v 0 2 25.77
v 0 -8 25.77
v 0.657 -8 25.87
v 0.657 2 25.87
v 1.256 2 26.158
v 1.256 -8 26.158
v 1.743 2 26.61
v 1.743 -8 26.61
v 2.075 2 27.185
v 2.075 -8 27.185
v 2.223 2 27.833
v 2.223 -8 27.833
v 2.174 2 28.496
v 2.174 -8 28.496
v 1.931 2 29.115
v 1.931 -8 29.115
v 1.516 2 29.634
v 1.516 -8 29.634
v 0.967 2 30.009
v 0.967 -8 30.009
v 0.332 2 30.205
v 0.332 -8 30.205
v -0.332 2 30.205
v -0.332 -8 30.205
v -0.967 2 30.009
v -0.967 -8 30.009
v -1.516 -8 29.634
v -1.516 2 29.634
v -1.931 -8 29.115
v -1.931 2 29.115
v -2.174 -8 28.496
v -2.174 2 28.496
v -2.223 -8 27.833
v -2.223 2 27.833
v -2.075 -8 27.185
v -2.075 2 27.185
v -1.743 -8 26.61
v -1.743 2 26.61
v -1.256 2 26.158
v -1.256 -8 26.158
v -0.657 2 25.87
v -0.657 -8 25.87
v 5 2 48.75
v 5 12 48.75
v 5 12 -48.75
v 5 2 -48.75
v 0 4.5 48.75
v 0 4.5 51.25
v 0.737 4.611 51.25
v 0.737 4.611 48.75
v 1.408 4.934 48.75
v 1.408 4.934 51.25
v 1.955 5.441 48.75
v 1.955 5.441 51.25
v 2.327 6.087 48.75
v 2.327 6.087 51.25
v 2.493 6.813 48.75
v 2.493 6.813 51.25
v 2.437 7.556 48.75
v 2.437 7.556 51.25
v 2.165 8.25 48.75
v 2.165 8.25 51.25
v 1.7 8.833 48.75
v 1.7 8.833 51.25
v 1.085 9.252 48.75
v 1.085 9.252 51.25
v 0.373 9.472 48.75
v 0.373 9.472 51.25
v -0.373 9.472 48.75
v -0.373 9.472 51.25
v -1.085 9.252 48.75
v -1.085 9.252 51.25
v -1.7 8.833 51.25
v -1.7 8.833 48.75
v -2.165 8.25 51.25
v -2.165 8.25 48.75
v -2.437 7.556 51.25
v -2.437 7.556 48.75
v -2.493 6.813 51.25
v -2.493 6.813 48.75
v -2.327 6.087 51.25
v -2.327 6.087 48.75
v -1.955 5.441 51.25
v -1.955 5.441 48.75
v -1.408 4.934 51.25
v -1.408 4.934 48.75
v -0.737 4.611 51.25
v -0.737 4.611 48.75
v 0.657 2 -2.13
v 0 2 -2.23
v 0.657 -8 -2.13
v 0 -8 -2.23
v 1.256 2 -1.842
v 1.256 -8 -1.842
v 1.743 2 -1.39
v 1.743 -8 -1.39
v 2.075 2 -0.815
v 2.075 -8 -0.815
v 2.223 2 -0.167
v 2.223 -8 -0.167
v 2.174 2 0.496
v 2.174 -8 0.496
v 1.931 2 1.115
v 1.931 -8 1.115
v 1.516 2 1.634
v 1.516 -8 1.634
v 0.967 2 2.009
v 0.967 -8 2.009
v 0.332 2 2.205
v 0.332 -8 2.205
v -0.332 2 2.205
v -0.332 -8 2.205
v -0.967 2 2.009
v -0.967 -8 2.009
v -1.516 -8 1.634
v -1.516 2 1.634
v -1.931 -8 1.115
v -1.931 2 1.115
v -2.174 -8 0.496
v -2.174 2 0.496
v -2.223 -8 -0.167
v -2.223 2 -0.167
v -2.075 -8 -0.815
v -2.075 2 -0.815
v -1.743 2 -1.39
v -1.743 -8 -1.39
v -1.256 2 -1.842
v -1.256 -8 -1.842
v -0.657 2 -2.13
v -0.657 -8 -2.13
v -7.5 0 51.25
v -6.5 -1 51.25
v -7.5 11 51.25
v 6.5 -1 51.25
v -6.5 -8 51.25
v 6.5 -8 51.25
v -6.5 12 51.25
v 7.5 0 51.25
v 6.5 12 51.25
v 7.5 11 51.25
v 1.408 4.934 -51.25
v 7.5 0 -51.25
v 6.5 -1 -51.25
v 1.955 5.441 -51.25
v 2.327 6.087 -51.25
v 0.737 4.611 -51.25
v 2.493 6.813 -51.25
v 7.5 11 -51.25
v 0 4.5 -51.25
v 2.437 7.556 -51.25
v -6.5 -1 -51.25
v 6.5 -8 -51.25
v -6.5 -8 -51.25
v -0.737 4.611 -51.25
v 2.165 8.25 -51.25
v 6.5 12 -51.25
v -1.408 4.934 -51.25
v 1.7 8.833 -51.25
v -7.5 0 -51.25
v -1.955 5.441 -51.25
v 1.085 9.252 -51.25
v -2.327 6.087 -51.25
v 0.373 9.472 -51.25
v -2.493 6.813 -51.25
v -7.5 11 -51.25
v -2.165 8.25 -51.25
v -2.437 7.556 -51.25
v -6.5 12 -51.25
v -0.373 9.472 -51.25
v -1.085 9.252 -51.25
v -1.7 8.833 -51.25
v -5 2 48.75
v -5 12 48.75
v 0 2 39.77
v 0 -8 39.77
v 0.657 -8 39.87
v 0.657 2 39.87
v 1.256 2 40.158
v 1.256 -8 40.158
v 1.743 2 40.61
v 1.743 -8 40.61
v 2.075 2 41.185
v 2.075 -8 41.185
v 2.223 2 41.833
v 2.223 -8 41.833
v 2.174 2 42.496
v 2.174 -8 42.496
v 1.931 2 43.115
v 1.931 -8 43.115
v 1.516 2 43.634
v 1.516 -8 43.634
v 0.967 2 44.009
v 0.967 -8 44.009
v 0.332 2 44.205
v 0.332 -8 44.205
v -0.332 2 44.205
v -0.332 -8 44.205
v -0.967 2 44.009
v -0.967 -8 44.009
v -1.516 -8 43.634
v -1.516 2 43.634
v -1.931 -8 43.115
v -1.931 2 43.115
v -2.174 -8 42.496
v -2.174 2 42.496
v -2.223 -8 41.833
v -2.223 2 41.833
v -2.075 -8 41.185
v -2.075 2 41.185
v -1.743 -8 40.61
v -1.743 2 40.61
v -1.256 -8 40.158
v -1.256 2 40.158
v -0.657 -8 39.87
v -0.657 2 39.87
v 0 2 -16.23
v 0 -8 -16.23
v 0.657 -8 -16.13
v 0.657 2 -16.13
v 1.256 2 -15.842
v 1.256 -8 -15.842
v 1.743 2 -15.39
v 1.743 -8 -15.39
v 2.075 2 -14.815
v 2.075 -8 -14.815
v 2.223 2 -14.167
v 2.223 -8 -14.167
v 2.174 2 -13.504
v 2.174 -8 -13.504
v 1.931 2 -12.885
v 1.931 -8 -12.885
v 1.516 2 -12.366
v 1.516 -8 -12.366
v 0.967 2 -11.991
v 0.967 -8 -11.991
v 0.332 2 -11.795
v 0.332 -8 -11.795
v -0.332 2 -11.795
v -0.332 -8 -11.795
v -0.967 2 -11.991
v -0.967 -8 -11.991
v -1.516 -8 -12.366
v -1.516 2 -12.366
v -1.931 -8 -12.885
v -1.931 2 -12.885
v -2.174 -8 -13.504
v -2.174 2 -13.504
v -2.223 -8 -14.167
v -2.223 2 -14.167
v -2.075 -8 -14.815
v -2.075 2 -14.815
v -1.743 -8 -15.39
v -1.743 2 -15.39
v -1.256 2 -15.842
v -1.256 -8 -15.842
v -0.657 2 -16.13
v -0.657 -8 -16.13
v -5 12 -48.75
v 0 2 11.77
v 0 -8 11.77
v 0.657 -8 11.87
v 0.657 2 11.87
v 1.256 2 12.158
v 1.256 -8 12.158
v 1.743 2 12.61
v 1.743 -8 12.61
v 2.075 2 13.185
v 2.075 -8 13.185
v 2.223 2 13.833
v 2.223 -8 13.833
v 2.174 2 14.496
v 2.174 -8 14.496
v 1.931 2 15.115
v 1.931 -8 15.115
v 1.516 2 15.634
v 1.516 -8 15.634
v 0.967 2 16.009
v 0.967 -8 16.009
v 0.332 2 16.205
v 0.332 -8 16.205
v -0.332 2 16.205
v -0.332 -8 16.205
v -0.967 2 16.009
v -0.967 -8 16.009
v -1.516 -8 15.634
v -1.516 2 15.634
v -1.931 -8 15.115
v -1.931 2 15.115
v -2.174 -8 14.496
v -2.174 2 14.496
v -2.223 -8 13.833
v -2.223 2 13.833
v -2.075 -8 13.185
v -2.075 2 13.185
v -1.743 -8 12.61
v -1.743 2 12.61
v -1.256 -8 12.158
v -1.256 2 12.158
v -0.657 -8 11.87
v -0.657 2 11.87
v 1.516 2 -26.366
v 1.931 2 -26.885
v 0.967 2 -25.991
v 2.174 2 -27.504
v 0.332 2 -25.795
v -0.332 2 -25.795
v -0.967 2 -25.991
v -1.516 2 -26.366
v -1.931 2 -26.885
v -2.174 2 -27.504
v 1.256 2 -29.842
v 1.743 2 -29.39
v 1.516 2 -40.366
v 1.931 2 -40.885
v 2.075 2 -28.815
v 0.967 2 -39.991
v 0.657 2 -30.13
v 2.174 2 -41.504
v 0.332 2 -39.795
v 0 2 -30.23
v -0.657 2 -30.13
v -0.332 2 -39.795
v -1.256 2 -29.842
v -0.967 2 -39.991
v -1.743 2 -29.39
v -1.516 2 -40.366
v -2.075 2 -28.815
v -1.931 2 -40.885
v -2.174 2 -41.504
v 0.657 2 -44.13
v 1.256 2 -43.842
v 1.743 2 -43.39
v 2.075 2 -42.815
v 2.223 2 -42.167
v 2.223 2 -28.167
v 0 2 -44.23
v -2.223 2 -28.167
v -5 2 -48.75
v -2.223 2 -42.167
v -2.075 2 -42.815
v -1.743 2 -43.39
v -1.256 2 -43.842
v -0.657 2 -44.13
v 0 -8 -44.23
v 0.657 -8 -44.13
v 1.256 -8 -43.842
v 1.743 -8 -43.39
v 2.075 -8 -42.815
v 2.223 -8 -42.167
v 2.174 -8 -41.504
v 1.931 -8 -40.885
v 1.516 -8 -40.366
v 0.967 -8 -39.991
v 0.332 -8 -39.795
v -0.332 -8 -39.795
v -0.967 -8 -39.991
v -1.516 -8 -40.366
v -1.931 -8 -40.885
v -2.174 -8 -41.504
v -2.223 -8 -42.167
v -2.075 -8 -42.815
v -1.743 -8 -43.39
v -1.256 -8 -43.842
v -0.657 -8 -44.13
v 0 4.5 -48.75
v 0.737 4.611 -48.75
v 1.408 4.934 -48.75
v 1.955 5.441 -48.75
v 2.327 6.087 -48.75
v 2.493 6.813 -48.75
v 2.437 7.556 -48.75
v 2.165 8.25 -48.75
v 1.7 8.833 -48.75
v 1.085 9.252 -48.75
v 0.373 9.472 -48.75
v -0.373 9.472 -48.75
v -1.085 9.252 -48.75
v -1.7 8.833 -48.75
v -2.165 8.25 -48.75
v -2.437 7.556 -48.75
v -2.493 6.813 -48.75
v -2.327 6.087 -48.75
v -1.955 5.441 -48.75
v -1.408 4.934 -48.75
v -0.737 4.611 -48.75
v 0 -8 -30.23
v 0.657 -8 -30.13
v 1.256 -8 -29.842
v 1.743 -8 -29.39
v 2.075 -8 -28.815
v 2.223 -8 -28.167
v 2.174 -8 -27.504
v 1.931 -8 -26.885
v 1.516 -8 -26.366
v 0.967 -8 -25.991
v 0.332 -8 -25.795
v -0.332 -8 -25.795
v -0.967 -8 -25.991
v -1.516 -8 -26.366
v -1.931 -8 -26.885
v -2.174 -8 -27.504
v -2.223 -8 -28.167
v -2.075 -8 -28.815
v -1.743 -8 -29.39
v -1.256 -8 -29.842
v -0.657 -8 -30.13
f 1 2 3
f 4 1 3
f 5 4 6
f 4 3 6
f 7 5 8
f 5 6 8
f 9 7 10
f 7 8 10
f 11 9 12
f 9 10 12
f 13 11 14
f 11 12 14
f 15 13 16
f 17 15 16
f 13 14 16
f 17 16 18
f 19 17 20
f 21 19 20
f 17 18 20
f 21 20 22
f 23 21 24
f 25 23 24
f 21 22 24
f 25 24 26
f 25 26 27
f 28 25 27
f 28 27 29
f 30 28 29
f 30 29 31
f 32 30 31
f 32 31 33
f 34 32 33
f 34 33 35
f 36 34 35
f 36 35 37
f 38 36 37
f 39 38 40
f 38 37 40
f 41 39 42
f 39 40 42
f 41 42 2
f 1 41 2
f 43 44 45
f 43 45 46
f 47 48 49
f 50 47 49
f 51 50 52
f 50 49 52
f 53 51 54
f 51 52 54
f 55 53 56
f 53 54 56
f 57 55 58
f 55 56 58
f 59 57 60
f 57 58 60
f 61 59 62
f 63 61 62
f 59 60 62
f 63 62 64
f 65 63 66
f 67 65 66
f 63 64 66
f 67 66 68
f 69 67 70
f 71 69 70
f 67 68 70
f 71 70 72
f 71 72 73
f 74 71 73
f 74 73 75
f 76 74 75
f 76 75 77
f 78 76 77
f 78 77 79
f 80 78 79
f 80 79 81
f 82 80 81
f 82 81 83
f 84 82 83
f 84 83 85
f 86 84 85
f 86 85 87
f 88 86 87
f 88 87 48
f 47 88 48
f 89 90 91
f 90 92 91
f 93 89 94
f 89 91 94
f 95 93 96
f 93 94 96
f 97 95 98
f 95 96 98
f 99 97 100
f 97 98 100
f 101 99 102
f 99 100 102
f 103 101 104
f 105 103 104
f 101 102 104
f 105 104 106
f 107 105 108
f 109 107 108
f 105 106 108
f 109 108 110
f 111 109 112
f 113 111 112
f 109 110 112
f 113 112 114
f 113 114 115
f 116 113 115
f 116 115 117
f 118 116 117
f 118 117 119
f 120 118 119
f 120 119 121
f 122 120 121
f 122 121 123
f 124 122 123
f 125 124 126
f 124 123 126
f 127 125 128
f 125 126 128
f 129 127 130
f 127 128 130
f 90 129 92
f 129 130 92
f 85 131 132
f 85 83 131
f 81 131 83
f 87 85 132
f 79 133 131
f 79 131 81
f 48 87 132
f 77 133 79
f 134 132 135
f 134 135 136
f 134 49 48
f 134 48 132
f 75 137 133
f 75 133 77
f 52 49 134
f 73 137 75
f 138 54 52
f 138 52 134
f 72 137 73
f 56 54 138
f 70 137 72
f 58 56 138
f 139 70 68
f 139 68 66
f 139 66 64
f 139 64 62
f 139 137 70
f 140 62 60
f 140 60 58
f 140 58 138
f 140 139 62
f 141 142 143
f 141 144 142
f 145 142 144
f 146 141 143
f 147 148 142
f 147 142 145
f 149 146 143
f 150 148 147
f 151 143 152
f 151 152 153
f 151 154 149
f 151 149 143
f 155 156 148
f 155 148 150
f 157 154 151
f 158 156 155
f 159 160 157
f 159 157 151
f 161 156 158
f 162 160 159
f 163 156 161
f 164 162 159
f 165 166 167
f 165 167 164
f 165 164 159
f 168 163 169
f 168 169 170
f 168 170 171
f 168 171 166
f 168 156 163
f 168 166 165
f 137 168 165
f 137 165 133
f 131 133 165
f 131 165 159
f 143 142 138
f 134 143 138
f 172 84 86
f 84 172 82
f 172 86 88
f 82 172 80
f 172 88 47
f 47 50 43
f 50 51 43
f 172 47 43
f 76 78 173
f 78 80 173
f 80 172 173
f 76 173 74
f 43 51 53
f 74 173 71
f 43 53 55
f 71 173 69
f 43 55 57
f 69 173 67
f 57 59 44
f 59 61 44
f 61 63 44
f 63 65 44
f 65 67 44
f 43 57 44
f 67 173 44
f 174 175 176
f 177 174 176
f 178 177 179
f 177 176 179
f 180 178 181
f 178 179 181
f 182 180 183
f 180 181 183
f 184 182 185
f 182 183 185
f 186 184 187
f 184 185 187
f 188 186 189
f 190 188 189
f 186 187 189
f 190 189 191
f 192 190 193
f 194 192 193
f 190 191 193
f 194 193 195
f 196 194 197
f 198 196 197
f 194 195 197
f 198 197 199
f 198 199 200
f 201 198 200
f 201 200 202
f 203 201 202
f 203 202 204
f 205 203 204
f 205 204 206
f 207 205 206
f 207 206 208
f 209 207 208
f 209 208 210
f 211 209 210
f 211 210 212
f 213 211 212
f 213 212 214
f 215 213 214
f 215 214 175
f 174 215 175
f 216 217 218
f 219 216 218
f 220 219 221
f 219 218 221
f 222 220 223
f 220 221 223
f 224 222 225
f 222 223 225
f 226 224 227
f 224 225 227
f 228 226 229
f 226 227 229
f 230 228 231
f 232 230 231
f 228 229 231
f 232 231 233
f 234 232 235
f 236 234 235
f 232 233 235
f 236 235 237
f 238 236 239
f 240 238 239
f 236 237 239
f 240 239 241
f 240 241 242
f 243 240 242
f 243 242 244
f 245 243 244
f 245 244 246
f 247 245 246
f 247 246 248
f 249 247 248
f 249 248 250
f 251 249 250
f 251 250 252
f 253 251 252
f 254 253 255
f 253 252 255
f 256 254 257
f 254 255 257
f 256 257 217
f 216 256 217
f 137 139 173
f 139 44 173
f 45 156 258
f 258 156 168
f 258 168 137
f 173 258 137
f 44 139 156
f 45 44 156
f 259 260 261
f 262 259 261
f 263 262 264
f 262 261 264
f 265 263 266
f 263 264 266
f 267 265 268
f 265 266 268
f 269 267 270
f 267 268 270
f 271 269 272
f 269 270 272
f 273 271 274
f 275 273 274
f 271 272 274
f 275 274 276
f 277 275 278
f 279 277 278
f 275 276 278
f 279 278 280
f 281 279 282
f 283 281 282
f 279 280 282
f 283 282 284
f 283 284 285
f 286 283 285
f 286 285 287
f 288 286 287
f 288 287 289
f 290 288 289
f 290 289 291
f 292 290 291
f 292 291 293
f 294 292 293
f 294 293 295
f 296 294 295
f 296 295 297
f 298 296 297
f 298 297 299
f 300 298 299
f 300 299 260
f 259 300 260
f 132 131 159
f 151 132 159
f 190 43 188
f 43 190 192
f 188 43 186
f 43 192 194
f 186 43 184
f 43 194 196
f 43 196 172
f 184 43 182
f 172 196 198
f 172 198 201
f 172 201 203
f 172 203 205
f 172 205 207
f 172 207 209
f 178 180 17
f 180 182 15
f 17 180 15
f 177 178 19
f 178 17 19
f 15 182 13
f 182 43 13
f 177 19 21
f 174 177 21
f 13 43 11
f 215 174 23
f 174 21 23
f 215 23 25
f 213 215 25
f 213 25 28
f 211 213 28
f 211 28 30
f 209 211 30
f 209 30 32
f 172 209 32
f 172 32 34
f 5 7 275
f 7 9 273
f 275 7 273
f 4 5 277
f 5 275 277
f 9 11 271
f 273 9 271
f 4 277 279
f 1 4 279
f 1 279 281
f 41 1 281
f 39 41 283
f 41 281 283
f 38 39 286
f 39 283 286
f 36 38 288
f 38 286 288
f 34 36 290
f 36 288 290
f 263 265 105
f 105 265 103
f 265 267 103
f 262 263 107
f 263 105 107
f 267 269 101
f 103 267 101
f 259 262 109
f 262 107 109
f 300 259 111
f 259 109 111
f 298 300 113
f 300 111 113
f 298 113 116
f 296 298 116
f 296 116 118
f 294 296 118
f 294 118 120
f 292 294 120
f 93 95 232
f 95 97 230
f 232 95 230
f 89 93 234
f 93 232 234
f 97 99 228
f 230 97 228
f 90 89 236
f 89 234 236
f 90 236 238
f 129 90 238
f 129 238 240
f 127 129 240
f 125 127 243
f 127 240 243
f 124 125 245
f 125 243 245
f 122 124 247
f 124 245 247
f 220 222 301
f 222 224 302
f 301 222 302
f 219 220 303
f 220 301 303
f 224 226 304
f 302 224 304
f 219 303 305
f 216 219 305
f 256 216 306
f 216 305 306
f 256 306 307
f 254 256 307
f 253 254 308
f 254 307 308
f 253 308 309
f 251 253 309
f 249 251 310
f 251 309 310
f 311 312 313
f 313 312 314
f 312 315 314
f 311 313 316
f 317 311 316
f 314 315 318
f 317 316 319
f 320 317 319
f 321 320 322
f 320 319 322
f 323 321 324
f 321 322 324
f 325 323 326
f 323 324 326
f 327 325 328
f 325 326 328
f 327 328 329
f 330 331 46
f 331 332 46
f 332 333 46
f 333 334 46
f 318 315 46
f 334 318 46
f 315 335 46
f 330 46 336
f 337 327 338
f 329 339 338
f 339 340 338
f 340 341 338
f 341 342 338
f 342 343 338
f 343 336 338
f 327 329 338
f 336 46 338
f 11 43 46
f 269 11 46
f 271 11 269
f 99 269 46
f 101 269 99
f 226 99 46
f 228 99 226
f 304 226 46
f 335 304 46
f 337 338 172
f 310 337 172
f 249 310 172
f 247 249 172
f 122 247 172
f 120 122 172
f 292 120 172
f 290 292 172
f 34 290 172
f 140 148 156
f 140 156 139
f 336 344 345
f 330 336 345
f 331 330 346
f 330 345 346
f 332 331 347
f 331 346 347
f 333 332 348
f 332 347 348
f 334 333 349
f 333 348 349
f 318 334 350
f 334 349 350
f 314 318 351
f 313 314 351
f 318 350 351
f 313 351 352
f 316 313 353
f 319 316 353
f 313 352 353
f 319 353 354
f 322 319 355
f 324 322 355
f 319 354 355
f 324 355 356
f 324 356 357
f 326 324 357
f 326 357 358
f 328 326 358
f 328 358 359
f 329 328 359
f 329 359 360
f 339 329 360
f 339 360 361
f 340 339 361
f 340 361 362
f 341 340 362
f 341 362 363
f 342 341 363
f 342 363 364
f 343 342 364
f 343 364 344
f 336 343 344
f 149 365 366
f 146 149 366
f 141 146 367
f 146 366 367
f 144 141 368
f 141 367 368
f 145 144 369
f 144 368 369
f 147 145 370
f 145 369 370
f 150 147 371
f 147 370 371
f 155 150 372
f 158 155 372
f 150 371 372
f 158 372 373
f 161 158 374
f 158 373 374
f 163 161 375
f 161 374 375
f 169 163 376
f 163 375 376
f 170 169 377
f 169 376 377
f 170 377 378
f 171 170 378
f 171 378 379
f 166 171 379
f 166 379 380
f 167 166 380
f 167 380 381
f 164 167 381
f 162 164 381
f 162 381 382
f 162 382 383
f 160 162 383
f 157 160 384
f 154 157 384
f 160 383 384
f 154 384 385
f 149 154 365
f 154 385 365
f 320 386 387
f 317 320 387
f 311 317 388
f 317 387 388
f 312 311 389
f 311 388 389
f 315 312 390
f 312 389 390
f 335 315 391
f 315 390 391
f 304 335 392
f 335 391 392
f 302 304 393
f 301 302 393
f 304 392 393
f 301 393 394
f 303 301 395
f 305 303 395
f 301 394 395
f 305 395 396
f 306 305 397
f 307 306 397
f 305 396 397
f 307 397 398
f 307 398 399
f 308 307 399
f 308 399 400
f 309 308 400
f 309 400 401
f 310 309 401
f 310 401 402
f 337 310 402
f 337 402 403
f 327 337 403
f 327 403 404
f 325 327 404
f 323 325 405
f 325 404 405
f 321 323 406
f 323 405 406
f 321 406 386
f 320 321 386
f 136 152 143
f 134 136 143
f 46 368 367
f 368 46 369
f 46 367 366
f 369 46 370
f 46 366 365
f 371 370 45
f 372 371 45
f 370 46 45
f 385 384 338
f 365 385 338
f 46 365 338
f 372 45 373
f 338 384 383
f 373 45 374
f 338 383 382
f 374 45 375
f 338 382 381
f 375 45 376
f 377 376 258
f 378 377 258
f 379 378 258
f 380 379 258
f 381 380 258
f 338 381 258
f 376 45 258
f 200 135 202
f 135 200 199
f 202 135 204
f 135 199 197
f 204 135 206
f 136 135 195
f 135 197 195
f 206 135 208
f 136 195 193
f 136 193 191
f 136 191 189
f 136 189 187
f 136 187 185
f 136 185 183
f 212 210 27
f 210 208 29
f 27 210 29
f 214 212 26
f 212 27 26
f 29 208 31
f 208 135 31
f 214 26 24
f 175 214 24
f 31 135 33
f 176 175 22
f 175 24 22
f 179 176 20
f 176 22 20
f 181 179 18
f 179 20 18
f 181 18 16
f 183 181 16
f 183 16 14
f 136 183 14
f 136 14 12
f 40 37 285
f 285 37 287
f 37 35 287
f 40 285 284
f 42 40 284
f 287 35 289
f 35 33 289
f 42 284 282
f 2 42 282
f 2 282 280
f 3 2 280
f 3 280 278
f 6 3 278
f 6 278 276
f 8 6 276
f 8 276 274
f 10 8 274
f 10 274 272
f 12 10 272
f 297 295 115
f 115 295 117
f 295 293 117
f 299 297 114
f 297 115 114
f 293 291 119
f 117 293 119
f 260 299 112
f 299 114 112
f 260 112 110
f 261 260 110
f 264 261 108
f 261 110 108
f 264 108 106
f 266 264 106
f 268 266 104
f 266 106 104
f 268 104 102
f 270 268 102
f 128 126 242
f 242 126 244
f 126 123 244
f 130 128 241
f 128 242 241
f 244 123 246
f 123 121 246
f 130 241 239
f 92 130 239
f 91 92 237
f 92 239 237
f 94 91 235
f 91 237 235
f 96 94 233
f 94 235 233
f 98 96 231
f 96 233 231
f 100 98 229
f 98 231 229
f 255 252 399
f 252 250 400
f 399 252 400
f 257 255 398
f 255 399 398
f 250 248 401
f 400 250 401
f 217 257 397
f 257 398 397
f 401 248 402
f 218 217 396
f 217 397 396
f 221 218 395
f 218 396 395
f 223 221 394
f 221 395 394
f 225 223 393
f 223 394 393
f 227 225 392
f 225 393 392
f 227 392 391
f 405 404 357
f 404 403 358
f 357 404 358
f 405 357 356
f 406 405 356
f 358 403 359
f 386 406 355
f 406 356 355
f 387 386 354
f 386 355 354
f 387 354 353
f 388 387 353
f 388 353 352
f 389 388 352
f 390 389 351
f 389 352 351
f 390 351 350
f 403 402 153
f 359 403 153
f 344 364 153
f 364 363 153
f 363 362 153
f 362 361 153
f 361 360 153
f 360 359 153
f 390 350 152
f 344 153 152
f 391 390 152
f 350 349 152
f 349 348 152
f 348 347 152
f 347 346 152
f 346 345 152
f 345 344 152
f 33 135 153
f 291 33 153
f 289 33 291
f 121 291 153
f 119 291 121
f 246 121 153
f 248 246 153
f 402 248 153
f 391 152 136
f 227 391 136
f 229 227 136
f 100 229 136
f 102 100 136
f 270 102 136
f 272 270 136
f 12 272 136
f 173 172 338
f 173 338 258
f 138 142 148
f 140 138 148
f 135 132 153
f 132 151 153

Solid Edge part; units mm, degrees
sketch "Sketch1" plane through (0, 0, 0) normal (0, 0, 1) x (1, 0, 0)
  line L0 (-6.5, 0) -> (-6.5, -8)
  line L1 (-6.5, -8) -> (6.5, -8)
  line L2 (6.5, -8) -> (6.5, 0)
  line L3 (6.5, 0) -> (7.5, 0)
  line L4 (7.5, 0) -> (7.5, 12)
  line L5 (7.5, 12) -> (5, 12)
  line L6 (5, 12) -> (5, 2)
  line L7 (5, 2) -> (-5, 2)
  line L8 (-5, 2) -> (-5, 12)
  line L9 (-5, 12) -> (-7.5, 12)
  line L10 (-7.5, 12) -> (-7.5, 0)
  line L11 (-7.5, 0) -> (-6.5, 0)
  dimension "D1" = 13
  dimension "D2" = 15
  dimension "D3" = 8
  dimension "D4" = 10
  dimension "D5" = 2.5
  dimension "D6" = 10
  dimension "D7" = 12
extrude "Ajout_matière_1" add sketch "Sketch1" along normal mid plane 100
hole "Perçage_1" at (0, -8, 42) direction (0, 1, 0) diameter 4.459 end up to next
pattern_linear "Pattern1" count 7 spacing 14 along (0, 0, -1) of "Perçage_1"
sketch "Sketch2" plane through (0, 2, -50) normal (0, 0, -1) x (0, 1, 0)
  line L0 (-10, -6.5) -> (-2, -6.5)
  line L1 (-2, -6.5) -> (-2, -7.5)
  line L2 (-2, -7.5) -> (10, -7.5)
  line L3 (10, -7.5) -> (10, 7.5)
  line L4 (10, 7.5) -> (-2, 7.5)
  line L5 (-2, 7.5) -> (-2, 6.5)
  line L6 (-2, 6.5) -> (-10, 6.5)
  line L7 (-10, 6.5) -> (-10, -6.5)
extrude "Protrusion1" add sketch "Sketch2" along normal mid plane 2.5
mirror "Mirror1" about plane through (0, 0, 0) normal (0, 0, 1) of "Protrusion1"
hole "Perçage_2" at (0, 7, 51.25) direction (0, 0, -1) diameter 5 end through all
chamfer "Chamfer1" distance 1 angle 45 4 edges at (-7.5, 12, 0) (-6.5, 0, 0) (6.5, 0, 0) (7.5, 12, 0)
properties material "Aluminium AU4G, 2024_T4"
